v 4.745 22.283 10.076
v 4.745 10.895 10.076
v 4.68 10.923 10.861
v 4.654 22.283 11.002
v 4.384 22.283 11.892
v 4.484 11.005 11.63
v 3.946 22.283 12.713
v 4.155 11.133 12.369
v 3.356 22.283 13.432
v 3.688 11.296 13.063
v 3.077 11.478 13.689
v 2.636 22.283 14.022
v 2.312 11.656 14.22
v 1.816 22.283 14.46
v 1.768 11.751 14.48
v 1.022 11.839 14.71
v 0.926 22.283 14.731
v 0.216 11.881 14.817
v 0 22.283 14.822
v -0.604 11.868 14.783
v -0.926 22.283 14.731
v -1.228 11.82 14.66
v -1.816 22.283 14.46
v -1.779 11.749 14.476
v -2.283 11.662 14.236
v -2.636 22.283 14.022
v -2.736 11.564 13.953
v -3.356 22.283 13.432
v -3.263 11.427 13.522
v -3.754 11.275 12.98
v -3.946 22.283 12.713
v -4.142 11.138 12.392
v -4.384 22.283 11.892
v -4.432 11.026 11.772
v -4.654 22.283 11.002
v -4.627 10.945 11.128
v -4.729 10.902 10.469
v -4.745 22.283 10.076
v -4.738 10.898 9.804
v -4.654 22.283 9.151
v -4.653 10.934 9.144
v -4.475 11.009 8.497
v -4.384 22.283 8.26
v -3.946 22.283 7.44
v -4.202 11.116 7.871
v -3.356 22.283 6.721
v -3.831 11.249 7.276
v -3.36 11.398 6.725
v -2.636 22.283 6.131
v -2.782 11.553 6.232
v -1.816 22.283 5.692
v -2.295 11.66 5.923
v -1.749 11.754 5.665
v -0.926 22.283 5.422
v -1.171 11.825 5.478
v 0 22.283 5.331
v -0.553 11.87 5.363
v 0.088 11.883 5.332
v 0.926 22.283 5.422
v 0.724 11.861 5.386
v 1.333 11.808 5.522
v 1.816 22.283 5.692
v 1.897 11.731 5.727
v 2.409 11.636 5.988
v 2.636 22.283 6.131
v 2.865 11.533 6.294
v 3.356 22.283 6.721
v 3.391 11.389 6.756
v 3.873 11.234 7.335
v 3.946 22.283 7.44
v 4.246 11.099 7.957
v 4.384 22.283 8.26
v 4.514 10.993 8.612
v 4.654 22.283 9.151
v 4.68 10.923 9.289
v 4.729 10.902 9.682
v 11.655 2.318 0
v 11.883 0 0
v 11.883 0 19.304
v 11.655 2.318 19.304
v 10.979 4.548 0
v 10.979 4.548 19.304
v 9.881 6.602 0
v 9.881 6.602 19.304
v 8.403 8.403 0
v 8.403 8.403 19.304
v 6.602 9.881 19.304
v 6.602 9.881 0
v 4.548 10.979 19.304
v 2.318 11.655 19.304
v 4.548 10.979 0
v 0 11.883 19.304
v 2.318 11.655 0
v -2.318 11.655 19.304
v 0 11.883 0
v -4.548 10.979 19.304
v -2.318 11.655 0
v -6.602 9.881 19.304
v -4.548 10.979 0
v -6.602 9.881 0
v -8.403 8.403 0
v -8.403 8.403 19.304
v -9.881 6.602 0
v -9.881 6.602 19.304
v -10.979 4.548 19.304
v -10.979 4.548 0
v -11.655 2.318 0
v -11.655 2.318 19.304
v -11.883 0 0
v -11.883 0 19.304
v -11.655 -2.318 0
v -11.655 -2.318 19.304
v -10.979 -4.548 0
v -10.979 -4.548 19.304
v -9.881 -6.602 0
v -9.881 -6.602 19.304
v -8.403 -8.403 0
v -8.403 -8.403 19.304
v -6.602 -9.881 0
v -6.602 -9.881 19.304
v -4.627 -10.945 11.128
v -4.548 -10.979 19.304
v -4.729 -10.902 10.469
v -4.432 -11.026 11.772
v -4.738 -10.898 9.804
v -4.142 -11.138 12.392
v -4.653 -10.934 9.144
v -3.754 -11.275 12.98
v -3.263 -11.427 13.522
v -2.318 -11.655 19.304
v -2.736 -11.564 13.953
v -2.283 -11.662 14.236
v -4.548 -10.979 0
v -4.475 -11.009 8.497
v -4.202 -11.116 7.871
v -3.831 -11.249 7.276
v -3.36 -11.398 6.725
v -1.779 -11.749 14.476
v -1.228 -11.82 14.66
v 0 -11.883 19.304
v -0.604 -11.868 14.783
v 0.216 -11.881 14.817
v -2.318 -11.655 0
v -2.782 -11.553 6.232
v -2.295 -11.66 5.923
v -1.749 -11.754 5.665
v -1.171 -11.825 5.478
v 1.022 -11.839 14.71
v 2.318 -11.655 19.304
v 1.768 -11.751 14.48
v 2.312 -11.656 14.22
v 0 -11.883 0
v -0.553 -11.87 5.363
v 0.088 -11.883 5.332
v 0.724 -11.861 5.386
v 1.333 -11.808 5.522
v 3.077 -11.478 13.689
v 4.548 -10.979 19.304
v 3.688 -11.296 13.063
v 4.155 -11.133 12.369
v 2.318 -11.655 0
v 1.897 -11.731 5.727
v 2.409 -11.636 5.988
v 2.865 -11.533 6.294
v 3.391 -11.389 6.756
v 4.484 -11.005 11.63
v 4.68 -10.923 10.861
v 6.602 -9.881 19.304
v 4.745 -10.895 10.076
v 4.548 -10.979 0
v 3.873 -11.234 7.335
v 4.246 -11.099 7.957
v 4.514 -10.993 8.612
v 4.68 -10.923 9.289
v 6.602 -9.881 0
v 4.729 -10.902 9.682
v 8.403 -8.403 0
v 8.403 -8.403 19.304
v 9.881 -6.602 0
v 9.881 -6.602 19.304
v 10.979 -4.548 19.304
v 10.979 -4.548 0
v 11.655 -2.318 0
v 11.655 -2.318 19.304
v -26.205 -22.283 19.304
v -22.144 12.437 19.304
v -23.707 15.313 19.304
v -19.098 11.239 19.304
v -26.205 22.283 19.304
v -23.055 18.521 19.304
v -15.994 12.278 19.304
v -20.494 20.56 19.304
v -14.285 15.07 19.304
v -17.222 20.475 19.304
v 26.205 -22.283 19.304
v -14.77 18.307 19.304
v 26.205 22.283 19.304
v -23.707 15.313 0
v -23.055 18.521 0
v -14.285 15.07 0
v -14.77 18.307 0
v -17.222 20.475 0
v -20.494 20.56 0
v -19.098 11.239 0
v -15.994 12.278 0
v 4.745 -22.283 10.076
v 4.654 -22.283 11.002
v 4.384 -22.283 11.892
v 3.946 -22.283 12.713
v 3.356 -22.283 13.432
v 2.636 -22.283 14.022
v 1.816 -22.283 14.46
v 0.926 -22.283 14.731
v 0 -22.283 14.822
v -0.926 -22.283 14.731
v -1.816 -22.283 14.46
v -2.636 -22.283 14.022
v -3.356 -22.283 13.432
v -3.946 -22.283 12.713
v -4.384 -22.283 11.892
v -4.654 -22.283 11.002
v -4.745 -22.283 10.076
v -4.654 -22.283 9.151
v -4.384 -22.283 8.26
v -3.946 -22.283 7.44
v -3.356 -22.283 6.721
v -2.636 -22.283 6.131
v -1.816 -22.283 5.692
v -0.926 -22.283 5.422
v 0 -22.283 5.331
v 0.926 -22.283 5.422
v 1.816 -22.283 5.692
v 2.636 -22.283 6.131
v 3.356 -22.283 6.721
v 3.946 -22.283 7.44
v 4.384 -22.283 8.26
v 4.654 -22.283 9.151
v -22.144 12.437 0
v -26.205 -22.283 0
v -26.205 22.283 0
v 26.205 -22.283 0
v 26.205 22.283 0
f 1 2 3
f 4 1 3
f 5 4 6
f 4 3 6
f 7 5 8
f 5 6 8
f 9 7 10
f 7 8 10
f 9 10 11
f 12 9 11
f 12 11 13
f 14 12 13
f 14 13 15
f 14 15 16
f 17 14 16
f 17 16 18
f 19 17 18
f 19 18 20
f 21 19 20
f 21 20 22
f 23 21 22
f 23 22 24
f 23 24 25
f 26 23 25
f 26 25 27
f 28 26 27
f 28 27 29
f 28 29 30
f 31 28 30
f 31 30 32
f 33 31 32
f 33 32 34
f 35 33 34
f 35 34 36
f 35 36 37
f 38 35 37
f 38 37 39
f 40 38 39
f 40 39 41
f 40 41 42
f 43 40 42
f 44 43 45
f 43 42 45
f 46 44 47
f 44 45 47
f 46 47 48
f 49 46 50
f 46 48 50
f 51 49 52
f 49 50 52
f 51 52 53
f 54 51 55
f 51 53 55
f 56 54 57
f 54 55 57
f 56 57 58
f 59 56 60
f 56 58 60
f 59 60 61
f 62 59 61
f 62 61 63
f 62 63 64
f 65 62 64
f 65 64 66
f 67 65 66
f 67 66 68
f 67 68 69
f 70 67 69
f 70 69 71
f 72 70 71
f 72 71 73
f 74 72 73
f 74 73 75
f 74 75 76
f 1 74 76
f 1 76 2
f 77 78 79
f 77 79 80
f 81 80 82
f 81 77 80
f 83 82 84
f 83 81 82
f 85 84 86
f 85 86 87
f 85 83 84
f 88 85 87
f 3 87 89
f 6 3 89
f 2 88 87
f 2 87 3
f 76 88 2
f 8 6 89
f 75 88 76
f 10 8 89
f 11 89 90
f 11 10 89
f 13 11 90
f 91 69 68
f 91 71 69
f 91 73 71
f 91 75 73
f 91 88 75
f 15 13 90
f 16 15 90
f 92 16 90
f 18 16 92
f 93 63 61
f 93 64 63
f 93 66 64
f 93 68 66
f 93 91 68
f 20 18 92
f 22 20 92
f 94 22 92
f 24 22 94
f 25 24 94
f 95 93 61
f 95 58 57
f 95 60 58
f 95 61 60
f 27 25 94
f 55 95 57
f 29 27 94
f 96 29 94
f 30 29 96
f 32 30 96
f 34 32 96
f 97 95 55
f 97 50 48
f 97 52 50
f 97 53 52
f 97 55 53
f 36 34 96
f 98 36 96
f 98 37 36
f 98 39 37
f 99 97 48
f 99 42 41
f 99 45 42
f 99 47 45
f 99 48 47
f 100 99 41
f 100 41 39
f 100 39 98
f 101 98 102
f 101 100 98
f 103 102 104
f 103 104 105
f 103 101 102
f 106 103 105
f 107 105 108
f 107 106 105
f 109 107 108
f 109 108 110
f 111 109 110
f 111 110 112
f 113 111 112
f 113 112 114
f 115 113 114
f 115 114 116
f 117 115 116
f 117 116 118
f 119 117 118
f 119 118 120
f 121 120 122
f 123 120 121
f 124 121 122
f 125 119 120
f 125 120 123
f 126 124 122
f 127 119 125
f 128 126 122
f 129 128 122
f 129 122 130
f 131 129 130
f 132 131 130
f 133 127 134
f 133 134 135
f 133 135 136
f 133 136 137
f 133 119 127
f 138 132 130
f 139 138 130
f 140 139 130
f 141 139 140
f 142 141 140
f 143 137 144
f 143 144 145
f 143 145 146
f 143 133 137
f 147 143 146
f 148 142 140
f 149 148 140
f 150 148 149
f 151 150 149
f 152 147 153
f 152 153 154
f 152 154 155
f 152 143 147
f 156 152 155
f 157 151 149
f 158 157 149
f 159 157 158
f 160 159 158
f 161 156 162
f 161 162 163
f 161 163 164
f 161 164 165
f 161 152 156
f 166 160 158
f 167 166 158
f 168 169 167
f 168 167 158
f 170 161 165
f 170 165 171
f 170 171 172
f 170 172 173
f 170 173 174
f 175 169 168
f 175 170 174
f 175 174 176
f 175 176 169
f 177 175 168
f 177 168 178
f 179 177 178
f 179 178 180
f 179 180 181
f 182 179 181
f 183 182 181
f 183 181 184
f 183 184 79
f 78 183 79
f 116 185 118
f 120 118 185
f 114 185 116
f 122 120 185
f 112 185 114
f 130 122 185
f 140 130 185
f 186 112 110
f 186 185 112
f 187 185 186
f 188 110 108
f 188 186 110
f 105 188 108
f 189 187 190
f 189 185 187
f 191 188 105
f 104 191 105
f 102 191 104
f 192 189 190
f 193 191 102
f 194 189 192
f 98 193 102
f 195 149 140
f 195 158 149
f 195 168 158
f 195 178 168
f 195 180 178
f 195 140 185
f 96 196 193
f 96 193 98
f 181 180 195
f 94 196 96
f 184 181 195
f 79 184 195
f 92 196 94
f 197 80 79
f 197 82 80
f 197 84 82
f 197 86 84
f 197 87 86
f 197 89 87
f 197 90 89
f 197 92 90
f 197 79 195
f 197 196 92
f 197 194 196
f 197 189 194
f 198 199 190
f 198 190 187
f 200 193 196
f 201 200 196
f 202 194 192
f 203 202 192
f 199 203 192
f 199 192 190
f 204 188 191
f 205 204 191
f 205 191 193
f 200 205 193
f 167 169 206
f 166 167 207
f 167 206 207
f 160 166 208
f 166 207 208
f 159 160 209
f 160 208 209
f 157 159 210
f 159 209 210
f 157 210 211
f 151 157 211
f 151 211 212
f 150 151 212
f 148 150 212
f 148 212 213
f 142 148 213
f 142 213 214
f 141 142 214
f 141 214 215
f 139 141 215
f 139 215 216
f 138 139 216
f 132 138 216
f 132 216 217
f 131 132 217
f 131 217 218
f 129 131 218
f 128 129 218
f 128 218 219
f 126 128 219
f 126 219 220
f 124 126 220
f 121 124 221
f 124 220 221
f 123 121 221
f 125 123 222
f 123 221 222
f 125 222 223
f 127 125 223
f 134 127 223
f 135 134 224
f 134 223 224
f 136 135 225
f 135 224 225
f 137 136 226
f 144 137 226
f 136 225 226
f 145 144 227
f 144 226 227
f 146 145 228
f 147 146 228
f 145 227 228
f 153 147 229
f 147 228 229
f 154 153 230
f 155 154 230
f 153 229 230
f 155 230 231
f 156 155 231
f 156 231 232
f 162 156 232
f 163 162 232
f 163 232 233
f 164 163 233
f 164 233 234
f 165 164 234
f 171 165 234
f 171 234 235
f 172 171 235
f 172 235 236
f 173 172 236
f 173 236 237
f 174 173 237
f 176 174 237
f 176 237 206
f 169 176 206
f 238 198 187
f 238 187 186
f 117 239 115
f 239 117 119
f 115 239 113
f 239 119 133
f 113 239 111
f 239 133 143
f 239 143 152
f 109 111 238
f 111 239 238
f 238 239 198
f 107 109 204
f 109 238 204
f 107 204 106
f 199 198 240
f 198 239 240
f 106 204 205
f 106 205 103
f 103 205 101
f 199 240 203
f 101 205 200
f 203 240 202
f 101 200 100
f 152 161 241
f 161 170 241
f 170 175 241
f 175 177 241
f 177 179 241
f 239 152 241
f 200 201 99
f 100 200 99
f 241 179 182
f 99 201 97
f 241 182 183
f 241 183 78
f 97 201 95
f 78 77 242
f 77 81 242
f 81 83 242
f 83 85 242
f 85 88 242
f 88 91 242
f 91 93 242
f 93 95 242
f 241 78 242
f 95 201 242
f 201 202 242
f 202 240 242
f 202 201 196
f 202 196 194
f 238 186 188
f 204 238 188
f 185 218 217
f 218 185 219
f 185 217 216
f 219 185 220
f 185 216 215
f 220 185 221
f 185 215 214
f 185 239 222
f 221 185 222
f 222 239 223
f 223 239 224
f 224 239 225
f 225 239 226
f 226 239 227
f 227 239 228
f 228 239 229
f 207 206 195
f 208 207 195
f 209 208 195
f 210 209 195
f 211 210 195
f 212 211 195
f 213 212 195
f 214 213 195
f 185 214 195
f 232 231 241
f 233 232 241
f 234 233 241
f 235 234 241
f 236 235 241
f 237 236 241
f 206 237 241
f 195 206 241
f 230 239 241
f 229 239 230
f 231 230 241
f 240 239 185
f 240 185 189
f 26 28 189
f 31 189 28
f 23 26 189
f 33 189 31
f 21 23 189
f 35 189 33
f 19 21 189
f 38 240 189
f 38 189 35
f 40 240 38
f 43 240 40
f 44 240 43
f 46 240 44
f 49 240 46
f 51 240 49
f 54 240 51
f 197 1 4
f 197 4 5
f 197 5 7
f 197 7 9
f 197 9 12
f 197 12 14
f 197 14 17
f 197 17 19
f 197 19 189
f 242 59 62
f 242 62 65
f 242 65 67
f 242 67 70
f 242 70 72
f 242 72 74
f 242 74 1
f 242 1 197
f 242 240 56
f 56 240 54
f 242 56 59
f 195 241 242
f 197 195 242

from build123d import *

# Parameters (mm, degrees)
F0_W     = 52.410952
F0_H     = 44.566952
F0_R     = 11.883232
F1_DEPTH = 19.304
F2_R     = 4.74542
F3_DEPTH = 58.4708
F5_DEPTH = 25.4


with BuildPart() as f1:
    # F0 (on Top) → F1 (new body)
    with BuildSketch(Plane.XY):
        Rectangle(F0_W, F0_H)
        Circle(F0_R, mode=Mode.SUBTRACT)
    extrude(amount=F1_DEPTH)

    # F2 (on face) → F3 (cut)
    with BuildSketch(Plane.XZ.offset(22.283476)):
        with Locations((0, 10.076289)):
            Circle(F2_R)
    extrude(amount=-F3_DEPTH, mode=Mode.SUBTRACT)

    # F4 (on face) → F5 (cut)
    with BuildSketch(Plane.XY.offset(19.304)):
        Polygon((-15.993849, 12.278491), (-14.284679, 15.070137), (-14.769814, 18.307295), (-17.222254, 20.475263), (-20.494475, 20.559624), (-23.055369, 18.520906), (-23.706664, 15.313047), (-22.143613, 12.437039), (-19.097584, 11.2386), align=None)
    extrude(amount=-F5_DEPTH, mode=Mode.SUBTRACT)


solid = f1.part
